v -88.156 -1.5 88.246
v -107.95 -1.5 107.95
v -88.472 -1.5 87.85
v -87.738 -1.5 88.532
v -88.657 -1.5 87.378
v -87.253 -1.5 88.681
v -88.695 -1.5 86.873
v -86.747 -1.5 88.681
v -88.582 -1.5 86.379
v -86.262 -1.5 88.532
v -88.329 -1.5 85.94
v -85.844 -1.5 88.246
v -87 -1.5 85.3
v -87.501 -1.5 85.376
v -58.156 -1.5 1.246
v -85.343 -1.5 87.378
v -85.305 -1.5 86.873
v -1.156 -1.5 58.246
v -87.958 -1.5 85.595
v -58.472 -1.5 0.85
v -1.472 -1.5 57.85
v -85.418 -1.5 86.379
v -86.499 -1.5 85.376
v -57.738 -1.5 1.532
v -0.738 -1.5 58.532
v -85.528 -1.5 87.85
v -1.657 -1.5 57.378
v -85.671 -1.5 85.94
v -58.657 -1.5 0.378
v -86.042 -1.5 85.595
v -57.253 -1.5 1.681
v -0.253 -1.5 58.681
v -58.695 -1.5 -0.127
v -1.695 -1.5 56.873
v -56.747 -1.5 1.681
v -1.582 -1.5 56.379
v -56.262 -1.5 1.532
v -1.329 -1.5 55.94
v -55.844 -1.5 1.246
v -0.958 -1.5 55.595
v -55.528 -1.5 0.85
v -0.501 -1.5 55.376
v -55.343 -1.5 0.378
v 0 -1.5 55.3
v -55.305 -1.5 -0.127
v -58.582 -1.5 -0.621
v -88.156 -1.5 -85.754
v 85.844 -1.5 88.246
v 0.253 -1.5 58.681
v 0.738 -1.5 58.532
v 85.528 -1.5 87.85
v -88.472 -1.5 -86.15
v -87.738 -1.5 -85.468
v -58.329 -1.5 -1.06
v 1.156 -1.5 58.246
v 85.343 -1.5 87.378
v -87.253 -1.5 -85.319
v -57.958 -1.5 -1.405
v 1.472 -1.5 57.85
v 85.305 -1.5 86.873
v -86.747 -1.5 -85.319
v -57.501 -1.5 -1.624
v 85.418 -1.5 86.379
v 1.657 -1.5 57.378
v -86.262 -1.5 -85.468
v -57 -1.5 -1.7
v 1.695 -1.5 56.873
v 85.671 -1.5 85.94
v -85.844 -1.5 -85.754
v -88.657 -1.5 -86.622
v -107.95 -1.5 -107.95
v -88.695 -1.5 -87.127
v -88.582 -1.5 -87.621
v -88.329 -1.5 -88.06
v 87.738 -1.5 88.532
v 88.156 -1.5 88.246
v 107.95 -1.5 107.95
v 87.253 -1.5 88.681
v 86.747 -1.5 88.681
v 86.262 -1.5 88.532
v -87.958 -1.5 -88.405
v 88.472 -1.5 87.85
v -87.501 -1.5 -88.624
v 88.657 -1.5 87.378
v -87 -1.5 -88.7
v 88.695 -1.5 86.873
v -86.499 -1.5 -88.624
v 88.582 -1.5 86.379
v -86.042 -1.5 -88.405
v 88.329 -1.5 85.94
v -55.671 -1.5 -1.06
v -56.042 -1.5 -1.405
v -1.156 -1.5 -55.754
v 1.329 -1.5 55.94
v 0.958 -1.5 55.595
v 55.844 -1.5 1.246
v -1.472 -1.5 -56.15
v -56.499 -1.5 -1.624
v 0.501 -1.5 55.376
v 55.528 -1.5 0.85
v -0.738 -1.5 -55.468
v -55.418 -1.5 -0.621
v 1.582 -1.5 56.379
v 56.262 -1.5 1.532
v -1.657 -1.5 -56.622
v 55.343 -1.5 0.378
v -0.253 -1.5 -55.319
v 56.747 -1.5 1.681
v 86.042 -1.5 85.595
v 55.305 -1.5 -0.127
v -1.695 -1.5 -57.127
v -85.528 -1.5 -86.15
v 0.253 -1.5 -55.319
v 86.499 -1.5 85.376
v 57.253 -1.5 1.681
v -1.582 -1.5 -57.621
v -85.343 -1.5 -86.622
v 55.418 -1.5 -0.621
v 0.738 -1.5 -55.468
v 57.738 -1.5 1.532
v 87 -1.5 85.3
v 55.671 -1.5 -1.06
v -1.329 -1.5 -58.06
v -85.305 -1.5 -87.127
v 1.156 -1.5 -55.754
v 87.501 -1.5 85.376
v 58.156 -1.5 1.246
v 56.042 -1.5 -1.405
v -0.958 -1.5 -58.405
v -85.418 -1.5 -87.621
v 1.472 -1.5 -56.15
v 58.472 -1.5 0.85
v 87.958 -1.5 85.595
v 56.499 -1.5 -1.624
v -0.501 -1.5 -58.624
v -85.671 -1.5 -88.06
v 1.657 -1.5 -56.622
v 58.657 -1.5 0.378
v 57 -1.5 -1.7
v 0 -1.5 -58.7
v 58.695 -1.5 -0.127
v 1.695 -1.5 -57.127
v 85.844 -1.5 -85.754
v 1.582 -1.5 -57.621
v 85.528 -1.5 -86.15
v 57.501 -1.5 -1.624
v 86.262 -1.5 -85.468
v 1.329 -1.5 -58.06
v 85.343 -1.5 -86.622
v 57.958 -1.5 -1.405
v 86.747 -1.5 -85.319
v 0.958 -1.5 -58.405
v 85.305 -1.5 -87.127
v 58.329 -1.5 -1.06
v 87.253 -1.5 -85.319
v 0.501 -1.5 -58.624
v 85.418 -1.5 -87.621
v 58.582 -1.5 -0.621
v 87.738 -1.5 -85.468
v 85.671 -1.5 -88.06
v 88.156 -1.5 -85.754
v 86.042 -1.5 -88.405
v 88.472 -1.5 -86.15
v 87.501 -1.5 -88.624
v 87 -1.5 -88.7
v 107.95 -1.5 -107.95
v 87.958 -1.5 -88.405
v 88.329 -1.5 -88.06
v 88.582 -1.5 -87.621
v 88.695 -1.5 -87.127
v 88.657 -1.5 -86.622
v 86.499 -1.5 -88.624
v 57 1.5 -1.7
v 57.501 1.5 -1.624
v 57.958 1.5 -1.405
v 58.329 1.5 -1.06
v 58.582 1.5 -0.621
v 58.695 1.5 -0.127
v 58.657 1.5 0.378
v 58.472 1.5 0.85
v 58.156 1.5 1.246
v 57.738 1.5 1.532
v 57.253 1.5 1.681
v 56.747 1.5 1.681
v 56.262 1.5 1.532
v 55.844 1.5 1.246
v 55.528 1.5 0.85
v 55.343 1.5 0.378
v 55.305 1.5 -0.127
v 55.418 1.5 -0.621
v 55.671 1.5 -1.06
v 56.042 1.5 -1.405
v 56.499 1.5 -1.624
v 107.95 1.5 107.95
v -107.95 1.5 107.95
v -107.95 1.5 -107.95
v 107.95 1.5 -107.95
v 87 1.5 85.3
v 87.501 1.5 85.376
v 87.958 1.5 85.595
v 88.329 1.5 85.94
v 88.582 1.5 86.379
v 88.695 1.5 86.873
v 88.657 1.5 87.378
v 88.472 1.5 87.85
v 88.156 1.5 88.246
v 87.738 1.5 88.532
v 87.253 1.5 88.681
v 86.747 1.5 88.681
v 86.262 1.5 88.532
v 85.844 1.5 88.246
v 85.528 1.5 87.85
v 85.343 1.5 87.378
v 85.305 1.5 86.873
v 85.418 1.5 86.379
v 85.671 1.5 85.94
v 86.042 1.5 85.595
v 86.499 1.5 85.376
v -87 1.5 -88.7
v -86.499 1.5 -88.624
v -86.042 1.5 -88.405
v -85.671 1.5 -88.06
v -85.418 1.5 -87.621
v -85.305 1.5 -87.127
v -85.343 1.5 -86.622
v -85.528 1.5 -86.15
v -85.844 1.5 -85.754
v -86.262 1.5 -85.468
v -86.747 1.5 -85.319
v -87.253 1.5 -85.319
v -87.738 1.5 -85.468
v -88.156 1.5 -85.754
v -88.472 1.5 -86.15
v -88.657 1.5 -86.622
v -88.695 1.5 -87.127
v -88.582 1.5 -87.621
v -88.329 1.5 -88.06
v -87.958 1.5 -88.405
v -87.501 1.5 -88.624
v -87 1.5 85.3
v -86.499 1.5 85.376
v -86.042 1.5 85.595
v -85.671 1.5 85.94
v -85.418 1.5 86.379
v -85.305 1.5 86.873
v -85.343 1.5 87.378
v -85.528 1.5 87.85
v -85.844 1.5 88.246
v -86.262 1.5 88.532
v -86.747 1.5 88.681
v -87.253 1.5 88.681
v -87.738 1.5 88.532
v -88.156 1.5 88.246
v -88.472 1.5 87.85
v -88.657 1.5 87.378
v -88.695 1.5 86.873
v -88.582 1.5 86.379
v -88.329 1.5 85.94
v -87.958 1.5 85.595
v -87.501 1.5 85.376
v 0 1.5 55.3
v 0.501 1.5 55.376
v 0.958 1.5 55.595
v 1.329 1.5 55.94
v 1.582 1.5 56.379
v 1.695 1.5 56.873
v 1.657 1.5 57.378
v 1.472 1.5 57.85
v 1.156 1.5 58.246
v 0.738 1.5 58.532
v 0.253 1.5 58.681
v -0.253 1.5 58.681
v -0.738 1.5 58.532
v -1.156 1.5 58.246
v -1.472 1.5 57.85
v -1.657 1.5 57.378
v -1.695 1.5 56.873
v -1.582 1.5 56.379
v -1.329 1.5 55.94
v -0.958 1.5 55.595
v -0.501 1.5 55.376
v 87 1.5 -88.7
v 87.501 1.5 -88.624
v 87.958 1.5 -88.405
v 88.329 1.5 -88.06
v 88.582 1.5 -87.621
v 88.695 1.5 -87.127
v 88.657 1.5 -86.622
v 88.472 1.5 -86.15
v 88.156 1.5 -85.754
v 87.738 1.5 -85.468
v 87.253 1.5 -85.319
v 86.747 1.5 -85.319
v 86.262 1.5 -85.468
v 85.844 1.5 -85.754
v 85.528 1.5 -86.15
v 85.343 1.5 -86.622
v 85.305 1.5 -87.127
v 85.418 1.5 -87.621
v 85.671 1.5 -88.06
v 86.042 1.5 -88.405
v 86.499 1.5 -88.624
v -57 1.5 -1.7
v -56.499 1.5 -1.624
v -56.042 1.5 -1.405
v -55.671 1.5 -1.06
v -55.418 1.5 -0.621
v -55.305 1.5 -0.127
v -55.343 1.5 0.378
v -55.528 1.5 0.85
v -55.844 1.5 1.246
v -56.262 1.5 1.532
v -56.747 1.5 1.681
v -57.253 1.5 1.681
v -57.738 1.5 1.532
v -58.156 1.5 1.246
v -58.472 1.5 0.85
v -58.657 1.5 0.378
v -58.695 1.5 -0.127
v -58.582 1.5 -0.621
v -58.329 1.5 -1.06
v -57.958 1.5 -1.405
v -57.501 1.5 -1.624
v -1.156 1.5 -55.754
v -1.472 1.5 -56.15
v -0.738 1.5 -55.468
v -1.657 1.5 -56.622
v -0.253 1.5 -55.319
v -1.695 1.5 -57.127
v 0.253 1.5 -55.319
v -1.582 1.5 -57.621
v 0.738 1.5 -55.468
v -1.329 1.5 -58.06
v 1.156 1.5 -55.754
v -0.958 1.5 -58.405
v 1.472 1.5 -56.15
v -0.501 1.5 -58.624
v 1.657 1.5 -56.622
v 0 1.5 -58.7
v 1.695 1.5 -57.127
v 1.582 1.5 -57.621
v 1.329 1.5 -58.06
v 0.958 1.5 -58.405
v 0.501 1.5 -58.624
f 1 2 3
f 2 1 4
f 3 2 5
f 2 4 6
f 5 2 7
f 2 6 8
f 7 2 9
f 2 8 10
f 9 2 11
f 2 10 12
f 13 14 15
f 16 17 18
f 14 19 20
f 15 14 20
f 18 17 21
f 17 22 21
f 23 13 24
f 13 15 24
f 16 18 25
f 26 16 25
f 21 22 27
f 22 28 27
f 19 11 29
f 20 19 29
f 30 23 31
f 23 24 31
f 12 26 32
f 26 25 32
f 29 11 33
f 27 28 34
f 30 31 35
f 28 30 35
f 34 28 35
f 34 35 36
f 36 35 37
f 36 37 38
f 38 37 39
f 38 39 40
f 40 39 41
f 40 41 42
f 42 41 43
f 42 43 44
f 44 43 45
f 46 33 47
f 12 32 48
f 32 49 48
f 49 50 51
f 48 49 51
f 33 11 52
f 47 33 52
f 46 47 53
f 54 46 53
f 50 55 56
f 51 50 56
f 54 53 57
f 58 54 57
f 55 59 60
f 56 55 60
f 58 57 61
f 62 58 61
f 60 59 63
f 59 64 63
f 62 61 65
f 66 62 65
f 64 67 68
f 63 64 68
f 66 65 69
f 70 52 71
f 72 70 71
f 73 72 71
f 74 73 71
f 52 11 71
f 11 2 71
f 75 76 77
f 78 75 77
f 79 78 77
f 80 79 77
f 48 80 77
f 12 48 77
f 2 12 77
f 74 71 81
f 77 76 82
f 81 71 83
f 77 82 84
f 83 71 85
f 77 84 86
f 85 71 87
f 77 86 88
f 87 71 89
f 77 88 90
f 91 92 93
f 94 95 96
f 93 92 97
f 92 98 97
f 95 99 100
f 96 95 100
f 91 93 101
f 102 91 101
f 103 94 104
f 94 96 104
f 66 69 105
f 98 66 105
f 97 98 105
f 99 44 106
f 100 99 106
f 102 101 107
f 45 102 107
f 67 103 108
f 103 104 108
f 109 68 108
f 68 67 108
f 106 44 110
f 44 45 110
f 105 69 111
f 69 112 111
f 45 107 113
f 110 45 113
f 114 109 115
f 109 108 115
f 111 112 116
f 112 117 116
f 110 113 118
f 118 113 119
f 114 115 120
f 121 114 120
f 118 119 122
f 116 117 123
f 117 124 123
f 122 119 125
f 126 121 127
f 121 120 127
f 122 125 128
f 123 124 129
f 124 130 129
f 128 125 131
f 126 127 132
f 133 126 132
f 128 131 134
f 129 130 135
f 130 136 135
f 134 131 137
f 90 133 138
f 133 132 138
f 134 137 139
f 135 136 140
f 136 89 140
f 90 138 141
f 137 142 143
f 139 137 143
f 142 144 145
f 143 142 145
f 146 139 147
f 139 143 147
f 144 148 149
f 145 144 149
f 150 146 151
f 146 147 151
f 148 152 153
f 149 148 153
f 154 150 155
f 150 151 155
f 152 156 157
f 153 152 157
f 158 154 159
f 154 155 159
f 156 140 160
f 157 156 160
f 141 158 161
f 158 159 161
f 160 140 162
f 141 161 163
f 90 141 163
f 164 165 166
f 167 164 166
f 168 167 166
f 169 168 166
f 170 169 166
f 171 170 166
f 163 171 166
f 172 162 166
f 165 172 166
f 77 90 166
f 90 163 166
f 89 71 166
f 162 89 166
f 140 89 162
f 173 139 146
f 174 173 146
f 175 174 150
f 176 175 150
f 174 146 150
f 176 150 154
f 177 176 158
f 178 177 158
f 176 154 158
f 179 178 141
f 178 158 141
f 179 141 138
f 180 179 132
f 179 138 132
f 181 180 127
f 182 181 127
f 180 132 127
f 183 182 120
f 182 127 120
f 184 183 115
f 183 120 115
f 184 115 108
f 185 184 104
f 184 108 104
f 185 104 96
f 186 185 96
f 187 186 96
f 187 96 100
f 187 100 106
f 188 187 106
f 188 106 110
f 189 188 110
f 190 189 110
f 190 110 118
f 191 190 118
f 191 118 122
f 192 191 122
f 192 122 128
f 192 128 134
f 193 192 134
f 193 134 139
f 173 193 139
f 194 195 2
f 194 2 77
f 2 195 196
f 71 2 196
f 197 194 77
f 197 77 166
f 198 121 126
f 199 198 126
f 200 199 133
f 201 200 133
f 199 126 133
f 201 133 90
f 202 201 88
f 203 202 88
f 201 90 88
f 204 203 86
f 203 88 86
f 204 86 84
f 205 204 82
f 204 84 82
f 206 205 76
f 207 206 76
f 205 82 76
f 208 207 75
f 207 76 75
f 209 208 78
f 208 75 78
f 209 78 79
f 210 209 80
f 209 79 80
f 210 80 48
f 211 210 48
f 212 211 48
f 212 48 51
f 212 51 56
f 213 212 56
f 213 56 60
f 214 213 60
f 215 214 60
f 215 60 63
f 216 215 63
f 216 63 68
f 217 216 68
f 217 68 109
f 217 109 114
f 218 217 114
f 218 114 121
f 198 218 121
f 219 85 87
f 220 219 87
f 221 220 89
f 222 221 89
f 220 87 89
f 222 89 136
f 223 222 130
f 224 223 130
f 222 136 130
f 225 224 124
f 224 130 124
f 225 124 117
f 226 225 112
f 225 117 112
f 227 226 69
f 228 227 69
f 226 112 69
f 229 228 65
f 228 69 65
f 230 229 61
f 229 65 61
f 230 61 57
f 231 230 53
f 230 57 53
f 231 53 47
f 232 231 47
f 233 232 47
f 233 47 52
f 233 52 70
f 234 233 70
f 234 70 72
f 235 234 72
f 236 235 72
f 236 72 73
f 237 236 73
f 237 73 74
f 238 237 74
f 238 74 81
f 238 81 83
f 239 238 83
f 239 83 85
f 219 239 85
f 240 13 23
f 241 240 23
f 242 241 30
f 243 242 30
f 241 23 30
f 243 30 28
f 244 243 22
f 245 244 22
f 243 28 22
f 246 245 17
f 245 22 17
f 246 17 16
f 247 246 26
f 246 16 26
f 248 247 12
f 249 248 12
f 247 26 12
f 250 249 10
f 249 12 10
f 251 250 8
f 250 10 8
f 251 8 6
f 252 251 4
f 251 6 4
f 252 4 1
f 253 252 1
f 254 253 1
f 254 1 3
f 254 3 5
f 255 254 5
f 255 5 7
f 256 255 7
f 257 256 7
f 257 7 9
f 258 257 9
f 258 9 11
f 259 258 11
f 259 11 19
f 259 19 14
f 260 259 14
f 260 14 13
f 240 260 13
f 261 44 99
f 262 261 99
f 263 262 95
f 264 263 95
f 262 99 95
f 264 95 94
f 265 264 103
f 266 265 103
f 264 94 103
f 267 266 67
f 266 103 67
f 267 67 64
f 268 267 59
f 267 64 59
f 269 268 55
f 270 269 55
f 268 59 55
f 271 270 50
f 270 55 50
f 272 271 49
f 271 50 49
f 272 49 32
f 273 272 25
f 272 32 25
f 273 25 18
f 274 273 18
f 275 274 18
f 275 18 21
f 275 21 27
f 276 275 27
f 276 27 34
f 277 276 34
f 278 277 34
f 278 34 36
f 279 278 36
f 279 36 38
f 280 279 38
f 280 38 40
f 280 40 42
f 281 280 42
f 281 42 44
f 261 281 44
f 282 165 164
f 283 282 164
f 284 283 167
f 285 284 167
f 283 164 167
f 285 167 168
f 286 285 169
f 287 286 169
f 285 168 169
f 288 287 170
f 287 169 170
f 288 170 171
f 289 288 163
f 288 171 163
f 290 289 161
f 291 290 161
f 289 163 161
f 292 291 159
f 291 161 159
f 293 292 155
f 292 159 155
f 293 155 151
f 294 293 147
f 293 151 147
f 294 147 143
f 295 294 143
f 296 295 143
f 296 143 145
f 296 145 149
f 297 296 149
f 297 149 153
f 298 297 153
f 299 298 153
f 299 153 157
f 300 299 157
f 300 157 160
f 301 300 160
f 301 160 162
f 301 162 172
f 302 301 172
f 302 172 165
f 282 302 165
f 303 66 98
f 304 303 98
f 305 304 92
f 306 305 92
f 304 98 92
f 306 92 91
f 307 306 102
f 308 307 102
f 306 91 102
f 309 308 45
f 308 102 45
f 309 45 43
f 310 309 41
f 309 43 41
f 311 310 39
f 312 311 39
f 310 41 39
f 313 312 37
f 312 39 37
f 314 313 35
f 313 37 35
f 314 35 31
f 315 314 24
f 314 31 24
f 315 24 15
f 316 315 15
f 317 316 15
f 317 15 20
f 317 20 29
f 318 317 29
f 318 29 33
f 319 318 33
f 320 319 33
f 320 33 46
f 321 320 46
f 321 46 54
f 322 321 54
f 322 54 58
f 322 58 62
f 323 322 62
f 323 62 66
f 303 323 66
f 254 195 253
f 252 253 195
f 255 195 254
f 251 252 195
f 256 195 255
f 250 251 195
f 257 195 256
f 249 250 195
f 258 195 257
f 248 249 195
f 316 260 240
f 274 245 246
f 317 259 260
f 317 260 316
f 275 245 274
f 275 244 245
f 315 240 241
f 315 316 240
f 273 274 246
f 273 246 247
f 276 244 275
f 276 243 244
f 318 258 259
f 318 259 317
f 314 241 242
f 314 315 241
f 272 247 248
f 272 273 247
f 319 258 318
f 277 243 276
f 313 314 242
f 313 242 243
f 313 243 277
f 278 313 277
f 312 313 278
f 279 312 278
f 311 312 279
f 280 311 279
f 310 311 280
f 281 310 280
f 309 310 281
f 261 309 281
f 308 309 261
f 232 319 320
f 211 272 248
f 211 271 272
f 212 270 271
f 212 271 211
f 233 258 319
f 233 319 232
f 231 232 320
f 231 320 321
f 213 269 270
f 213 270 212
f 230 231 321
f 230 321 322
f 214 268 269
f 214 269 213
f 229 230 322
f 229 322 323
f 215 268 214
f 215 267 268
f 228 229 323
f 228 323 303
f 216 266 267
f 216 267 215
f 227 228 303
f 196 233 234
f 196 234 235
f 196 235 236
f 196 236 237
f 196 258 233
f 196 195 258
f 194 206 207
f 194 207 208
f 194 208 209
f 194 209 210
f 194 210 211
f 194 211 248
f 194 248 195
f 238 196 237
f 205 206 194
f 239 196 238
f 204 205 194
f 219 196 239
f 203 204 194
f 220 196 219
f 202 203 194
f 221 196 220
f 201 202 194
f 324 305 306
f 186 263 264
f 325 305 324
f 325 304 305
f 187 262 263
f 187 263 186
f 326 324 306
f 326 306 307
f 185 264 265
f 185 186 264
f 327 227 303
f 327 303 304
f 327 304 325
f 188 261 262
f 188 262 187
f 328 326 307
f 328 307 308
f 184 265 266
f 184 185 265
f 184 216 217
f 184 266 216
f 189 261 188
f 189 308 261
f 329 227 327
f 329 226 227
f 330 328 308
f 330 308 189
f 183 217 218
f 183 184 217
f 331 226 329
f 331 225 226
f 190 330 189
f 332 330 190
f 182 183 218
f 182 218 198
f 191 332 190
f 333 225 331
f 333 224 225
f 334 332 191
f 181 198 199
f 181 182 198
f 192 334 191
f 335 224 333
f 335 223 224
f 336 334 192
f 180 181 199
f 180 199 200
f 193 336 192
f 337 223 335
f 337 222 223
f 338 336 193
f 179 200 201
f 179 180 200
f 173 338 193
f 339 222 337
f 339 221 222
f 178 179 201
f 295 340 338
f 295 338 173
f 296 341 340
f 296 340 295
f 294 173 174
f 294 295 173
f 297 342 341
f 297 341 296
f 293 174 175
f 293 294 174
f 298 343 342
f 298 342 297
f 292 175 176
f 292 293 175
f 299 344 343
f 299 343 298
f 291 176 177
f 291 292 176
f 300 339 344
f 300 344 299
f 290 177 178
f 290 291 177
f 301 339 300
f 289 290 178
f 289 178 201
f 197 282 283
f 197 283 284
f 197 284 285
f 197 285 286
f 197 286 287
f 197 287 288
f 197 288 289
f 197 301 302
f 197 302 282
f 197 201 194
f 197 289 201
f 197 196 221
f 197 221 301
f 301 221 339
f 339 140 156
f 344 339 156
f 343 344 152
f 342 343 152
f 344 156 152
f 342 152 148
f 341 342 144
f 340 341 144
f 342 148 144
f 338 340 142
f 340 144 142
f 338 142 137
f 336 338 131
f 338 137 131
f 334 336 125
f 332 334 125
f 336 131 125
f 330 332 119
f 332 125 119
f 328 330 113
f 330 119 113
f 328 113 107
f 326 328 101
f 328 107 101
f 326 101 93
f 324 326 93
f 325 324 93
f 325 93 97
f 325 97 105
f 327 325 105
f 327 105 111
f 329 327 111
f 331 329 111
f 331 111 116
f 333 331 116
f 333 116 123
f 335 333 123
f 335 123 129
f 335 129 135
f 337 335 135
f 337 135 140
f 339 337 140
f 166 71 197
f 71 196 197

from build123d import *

# Parameters (mm, degrees)
SKETCH1_W                = 215.9
SKETCH1_H                = 215.9
BOSS_EXTRUDE1_DEPTH      = 1.5
M3_CLEARANCE_HOLE1_D     = 3.4
M3_CLEARANCE_HOLE1_DEPTH = 10
M3_CLEARANCE_HOLE1_TIP   = 1.021463052


with BuildPart() as part:
    # Sketch1 → Boss-Extrude1 (new, symmetric)
    with BuildSketch(Plane(origin=(0, 0, 0), x_dir=(1, 0, 0), z_dir=(0, 1, 0))):
        Rectangle(SKETCH1_W, SKETCH1_H)
    extrude(amount=BOSS_EXTRUDE1_DEPTH, both=True)

    # M3 Clearance Hole1
    with Locations(Plane(origin=(-87, 1.5, -87), x_dir=(0, 0, 1), z_dir=(0, 1, 0))):
        with Locations((0, 0), (30, 87), (0, 174), (87, 144), (174, 174), (144, 87), (174, 0), (87, 30)):
            Hole(M3_CLEARANCE_HOLE1_D / 2, depth=M3_CLEARANCE_HOLE1_DEPTH)
            with Locations((0, 0, -(M3_CLEARANCE_HOLE1_DEPTH + M3_CLEARANCE_HOLE1_TIP / 2))):  # 118° drill point
                Cone(0, M3_CLEARANCE_HOLE1_D / 2, M3_CLEARANCE_HOLE1_TIP, mode=Mode.SUBTRACT)


solid = part.part
